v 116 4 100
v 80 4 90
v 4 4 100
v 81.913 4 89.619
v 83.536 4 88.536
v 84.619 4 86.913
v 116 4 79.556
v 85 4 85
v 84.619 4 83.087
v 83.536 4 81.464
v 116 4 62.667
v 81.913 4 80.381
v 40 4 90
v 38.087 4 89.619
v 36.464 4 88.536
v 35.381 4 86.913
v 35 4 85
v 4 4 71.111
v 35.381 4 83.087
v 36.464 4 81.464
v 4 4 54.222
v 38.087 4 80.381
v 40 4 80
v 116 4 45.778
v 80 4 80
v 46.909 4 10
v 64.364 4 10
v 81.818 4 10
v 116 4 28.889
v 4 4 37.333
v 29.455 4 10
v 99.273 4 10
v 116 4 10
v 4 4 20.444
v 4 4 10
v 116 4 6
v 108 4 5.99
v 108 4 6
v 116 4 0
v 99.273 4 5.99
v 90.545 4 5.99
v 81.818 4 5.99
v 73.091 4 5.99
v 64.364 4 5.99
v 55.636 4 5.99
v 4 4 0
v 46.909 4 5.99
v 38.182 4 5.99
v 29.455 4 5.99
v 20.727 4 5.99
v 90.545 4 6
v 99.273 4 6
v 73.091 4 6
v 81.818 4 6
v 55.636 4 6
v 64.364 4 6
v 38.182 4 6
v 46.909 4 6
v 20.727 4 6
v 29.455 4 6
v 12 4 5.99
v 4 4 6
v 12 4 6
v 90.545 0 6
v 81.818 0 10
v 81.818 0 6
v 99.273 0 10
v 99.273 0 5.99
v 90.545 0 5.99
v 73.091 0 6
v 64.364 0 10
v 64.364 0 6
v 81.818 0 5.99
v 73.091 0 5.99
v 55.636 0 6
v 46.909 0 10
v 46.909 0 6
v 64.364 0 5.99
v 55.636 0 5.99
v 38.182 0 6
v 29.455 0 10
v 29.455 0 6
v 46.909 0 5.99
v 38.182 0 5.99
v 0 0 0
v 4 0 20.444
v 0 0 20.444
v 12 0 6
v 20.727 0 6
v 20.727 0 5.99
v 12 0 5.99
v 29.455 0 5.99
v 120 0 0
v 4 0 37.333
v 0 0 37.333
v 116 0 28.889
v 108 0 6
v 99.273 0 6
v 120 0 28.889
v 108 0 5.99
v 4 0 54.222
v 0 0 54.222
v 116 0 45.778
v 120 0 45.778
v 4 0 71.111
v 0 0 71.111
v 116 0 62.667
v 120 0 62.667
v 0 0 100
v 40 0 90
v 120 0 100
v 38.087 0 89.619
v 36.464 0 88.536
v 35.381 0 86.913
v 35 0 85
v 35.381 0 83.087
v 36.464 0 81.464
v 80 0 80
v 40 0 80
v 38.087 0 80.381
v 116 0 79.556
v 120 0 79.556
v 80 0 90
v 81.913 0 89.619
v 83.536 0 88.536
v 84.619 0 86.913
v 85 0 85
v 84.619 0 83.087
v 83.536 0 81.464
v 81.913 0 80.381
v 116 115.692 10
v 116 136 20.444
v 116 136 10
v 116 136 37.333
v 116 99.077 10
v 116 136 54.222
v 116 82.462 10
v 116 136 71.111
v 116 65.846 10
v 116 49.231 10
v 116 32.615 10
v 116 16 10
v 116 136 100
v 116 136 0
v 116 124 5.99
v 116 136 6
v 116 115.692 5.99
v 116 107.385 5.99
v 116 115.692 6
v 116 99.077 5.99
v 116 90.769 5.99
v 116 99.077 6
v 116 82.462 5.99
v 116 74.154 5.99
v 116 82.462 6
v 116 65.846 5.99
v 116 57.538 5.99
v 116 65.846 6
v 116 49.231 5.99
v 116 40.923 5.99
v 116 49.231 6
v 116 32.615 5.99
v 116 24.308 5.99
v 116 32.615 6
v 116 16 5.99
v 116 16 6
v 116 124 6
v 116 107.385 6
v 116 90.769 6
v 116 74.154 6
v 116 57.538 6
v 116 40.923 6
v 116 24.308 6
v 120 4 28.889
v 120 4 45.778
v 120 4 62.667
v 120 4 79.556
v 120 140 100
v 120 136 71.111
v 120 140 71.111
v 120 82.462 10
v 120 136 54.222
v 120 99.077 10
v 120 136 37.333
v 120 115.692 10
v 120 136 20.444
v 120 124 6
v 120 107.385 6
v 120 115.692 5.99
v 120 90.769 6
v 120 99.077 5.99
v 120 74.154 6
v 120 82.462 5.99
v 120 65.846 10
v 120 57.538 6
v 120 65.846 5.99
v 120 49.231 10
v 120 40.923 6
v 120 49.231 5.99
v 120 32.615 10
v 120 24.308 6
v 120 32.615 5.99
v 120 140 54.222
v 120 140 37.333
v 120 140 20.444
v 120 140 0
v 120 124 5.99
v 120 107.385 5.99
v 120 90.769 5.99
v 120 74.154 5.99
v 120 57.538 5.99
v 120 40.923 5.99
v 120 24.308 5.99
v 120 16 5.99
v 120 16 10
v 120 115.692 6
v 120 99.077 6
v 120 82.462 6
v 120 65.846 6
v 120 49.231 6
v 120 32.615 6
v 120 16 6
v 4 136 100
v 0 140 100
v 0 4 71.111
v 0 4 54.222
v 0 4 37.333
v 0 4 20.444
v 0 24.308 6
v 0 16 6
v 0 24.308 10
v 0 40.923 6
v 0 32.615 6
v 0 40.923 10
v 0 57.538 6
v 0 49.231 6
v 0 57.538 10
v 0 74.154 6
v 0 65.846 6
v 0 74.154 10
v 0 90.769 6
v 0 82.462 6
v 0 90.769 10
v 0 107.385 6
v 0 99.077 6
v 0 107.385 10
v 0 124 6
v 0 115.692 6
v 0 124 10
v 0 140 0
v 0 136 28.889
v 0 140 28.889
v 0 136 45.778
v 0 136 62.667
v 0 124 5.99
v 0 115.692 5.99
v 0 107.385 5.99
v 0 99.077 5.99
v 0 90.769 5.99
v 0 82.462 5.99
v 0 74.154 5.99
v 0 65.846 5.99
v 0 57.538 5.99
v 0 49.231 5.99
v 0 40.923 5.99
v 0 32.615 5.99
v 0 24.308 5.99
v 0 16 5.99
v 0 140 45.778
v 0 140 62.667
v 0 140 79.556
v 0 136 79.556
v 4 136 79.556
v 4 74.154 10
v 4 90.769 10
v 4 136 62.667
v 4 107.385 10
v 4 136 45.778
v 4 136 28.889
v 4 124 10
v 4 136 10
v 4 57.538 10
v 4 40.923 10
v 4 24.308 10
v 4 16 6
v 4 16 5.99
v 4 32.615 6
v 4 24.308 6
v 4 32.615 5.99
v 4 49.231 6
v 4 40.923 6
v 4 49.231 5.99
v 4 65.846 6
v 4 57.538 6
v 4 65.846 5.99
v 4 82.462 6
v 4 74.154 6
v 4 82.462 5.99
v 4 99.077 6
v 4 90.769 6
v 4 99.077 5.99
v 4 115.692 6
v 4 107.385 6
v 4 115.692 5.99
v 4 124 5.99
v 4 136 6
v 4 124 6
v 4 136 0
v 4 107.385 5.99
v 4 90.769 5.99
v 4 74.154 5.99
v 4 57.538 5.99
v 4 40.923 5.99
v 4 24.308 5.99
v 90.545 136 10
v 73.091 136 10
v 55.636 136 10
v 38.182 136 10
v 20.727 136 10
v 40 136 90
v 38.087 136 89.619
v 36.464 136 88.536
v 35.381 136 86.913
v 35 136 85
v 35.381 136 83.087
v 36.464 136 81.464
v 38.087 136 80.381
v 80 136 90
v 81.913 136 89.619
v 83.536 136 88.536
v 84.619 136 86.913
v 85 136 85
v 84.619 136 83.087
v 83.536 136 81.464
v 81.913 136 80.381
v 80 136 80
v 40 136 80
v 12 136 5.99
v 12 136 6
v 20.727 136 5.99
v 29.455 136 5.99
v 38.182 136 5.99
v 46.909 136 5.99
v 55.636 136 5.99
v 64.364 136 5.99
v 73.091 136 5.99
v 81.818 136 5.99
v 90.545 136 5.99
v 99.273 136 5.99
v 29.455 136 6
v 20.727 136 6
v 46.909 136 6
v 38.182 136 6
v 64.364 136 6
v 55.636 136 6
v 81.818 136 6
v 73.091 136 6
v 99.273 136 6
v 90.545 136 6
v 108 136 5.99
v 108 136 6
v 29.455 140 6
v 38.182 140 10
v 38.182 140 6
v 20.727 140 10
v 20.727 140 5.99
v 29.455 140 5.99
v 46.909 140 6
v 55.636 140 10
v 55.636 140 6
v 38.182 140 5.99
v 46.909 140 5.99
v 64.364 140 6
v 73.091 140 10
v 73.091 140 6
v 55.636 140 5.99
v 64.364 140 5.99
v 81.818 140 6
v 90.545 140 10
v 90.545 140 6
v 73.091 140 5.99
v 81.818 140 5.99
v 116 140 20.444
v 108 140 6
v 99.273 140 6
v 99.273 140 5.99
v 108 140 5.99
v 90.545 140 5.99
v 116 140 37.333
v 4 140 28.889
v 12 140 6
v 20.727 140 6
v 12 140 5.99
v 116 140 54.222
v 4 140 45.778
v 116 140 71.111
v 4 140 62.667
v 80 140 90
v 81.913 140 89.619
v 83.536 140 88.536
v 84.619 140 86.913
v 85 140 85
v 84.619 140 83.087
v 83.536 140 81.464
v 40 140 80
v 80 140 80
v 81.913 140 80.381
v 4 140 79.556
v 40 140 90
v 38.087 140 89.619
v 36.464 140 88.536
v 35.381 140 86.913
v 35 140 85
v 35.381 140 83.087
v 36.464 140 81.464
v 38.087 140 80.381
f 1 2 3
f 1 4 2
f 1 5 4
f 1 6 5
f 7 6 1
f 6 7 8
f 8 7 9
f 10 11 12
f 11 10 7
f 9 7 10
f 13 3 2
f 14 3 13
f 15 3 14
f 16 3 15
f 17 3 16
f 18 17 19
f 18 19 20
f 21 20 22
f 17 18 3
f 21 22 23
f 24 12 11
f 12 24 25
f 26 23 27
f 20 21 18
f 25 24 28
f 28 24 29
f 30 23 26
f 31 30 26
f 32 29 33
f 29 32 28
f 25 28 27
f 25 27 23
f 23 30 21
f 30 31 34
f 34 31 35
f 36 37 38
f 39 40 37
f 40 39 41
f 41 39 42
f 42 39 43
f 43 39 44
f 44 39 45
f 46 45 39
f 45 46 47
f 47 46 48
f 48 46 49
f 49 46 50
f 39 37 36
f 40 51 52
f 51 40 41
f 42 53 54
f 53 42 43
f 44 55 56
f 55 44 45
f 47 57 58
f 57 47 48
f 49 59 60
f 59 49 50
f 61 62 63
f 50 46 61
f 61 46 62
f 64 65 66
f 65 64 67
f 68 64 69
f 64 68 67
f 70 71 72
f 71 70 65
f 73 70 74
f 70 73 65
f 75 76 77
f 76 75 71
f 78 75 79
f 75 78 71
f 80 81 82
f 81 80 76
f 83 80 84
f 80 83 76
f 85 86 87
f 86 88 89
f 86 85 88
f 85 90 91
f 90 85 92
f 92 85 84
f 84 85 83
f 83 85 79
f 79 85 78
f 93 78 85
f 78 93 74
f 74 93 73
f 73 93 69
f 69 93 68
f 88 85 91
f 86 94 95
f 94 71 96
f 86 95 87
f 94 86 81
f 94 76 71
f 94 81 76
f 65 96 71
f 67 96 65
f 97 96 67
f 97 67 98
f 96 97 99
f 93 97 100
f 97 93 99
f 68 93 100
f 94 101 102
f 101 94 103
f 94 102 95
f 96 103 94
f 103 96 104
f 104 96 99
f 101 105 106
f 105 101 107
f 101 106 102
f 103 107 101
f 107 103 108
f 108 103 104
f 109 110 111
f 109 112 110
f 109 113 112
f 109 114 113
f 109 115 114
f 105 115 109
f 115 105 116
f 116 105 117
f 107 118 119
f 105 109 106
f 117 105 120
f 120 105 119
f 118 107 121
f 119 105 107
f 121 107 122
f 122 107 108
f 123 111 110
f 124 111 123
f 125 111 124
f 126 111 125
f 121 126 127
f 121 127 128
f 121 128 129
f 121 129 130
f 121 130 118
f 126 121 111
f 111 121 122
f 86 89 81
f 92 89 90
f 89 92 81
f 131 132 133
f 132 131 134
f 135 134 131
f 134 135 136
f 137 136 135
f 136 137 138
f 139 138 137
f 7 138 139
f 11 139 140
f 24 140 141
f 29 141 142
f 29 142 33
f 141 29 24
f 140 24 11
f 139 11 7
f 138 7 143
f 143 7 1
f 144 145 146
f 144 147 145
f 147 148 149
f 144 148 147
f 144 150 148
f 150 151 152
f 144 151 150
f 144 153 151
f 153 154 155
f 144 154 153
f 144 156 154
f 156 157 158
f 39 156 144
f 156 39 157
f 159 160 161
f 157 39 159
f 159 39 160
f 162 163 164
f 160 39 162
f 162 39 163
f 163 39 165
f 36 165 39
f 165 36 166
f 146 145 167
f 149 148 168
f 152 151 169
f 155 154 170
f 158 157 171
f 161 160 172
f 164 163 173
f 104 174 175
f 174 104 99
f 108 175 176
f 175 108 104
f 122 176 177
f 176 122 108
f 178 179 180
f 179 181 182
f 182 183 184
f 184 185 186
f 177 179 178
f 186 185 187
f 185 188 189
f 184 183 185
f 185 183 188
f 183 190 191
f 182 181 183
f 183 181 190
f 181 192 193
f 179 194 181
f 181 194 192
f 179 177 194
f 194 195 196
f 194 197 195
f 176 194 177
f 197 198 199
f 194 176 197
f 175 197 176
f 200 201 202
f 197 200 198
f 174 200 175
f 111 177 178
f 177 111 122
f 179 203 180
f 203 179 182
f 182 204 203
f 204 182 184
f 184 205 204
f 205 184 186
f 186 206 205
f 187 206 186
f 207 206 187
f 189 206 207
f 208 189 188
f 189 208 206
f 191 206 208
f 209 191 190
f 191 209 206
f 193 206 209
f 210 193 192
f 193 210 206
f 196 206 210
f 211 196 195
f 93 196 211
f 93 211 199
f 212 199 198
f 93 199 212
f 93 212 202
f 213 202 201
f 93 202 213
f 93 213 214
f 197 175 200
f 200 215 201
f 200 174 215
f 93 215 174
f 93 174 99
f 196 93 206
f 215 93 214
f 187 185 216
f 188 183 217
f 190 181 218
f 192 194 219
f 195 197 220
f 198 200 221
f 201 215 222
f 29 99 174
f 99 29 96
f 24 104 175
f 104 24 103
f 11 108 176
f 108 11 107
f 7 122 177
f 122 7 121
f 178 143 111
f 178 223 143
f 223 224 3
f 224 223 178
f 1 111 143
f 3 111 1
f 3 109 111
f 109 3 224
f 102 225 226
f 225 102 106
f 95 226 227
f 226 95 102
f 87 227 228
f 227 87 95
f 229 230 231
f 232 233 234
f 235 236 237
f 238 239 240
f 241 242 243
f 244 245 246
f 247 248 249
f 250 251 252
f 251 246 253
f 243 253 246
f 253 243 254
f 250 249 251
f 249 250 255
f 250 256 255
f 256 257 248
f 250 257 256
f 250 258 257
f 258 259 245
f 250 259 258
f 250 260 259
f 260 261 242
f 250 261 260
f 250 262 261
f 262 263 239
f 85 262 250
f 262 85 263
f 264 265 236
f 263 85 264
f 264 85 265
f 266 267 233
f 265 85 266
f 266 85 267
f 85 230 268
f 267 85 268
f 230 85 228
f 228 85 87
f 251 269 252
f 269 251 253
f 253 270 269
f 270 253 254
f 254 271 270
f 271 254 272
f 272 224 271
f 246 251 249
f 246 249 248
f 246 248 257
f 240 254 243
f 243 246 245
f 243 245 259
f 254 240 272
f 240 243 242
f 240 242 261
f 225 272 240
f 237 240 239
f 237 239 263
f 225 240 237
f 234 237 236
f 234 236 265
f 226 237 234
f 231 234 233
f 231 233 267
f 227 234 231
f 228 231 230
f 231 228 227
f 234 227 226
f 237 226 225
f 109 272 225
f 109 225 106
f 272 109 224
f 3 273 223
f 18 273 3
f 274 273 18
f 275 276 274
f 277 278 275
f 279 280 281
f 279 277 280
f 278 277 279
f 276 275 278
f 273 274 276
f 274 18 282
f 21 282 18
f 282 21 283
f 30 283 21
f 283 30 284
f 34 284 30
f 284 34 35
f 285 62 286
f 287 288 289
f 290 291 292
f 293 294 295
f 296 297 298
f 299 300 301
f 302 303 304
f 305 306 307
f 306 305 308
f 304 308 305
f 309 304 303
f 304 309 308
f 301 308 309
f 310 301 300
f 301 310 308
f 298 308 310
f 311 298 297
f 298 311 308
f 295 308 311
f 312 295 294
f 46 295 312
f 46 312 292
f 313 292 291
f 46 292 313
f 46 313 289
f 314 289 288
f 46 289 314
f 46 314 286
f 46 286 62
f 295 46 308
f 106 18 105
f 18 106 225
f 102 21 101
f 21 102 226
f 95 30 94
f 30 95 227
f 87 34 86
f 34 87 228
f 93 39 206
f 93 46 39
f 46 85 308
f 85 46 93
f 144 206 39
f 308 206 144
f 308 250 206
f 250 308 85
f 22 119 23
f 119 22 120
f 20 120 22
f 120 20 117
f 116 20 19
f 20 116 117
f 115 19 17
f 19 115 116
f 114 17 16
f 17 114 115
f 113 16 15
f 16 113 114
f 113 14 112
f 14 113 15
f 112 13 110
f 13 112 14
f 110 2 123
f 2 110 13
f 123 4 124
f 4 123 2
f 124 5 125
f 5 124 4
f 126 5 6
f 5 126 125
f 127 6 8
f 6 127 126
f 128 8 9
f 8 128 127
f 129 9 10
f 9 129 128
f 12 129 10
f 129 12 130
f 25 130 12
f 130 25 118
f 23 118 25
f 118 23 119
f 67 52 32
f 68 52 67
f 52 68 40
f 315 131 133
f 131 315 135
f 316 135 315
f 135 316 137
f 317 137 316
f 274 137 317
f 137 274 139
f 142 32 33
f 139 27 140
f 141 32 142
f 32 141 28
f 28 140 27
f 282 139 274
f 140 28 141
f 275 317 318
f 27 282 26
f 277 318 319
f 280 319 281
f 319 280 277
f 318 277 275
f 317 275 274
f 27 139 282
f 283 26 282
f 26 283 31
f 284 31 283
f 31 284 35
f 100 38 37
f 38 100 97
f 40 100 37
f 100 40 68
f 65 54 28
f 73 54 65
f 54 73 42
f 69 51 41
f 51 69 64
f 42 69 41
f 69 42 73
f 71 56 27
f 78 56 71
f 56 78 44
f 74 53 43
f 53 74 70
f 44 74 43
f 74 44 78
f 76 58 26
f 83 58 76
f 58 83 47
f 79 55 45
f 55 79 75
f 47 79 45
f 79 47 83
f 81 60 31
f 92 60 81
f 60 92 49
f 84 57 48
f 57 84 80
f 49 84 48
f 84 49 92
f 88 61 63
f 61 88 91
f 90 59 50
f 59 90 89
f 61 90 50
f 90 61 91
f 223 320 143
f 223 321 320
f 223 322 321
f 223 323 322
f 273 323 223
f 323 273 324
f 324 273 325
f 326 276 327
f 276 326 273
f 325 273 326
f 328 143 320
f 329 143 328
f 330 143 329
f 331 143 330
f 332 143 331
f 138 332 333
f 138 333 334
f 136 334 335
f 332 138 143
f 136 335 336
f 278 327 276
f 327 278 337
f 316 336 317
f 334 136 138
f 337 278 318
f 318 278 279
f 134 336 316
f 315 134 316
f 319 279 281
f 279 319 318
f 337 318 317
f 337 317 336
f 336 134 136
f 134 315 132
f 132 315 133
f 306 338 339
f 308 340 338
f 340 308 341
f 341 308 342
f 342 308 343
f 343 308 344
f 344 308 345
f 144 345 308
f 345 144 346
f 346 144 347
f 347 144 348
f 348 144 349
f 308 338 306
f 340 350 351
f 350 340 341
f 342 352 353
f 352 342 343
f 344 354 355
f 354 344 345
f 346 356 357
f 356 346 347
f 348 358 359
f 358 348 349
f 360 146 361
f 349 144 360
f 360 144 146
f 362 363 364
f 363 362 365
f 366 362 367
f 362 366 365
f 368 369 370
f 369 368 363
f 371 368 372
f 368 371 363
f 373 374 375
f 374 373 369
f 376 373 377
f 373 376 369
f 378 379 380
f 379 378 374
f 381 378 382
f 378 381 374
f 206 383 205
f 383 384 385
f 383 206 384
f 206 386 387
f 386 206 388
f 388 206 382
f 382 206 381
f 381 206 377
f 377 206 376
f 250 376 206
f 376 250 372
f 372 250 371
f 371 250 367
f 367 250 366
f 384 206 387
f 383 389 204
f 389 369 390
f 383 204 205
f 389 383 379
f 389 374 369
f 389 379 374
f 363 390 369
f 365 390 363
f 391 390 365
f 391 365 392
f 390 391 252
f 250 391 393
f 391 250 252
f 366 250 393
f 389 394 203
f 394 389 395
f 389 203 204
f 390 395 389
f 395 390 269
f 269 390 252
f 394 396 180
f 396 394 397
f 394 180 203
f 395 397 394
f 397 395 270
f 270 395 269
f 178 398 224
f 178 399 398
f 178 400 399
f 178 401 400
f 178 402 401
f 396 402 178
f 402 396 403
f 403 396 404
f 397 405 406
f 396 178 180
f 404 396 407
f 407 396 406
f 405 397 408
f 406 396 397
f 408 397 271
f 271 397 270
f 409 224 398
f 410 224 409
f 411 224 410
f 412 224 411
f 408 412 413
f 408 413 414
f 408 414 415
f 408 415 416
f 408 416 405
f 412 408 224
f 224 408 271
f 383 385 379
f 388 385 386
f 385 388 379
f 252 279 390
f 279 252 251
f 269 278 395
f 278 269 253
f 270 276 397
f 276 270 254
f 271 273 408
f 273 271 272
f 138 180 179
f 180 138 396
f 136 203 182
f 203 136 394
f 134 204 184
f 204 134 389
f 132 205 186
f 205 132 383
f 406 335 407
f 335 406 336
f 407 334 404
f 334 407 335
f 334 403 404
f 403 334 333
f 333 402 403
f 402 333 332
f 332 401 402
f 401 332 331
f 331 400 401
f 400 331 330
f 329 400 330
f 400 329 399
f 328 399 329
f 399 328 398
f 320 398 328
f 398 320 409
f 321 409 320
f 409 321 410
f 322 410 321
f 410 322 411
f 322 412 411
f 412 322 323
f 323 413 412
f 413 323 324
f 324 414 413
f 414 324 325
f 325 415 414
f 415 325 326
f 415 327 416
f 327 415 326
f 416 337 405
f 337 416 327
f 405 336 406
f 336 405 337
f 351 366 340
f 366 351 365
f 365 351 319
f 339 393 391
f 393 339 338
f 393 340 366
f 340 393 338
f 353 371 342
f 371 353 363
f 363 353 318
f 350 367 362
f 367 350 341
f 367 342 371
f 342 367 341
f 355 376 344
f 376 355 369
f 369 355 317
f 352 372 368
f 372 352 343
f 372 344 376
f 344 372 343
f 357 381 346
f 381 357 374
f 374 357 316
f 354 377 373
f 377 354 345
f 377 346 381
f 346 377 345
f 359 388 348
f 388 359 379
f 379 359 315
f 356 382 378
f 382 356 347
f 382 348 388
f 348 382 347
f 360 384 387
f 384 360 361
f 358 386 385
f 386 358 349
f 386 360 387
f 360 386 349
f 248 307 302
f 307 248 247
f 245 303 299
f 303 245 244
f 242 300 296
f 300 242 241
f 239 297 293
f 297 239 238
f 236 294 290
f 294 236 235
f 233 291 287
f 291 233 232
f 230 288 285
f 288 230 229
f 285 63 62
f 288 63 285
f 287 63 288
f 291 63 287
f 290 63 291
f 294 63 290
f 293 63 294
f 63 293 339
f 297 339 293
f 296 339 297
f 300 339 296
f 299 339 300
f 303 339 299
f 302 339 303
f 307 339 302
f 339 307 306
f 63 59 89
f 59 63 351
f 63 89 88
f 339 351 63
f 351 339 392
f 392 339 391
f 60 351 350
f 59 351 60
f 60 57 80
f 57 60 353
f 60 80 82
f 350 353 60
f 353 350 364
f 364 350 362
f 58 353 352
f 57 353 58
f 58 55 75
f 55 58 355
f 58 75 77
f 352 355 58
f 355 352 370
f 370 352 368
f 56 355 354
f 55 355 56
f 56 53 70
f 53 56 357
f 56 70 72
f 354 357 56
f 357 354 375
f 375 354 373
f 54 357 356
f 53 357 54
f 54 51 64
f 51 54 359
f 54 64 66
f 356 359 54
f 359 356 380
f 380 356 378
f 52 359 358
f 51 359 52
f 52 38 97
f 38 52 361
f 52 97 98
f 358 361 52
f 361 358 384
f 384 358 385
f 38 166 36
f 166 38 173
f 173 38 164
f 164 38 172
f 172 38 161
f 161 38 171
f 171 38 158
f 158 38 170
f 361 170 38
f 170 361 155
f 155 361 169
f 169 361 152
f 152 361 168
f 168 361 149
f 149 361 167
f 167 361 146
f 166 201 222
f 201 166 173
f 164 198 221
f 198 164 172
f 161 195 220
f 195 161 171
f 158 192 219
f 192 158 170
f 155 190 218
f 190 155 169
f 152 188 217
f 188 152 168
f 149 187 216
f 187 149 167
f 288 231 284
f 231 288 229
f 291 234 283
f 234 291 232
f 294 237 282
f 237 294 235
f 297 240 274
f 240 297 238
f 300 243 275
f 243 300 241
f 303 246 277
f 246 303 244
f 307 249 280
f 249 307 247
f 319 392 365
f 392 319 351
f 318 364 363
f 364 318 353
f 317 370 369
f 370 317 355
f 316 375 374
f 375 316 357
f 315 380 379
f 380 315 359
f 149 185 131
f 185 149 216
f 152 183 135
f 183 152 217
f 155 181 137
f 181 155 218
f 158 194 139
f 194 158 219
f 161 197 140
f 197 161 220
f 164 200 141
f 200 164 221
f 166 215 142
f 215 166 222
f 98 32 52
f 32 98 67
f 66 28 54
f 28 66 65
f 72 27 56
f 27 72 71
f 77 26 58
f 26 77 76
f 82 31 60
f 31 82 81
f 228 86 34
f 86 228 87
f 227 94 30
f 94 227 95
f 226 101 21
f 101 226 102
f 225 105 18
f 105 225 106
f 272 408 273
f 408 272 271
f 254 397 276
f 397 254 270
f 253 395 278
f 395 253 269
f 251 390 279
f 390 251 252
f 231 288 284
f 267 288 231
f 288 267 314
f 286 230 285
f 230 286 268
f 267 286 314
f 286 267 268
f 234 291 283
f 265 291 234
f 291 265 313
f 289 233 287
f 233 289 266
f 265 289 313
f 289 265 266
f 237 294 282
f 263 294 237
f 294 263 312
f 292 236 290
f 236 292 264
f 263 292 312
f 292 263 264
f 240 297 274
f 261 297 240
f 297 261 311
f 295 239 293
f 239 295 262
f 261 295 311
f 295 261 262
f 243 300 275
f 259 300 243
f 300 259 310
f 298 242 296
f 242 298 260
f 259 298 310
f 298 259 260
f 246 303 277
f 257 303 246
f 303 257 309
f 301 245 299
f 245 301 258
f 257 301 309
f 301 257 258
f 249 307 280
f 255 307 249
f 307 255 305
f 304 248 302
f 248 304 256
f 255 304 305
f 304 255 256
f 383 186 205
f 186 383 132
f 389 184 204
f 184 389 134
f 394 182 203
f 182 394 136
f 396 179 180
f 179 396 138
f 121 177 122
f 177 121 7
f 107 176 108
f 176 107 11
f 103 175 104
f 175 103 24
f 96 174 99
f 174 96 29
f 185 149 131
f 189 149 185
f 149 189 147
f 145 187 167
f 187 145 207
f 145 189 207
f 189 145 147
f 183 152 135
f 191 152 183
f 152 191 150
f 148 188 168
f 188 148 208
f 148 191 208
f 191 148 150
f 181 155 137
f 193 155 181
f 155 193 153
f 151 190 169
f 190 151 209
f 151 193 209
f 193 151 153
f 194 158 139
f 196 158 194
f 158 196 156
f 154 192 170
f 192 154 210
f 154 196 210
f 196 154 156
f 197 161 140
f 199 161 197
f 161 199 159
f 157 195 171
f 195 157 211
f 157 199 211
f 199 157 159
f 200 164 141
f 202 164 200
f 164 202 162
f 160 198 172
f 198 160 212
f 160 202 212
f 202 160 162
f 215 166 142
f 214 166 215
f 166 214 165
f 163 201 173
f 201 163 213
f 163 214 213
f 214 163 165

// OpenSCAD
// file: box.scad
// Display options:

explode = 0; // 3d explosion
front_color = "RoyalBlue";
back_color = "RoyalBlue";
bottom_color = "SlateBlue";
top_color = "SlateBlue";
left_color = "MediumAquamarine";
right_color = "MediumAquamarine";

// Cutting options:

kerf = 0.3; // Kerf width (cuts will be offset by half this)
labels = false;

// Examples:

// box(width = 130, height = 150, depth = 170, thickness = 4);
// box(width = 130, height = 150, depth = 170, thickness = 4, open = true, inset = 8);
// lidbox(width = 130, height = 150, depth = 170, thickness = 4);

// box2d();

// Internals:

e = 0.01;
kc = kerf / 2;

module box(width, height, depth, thickness, finger_width, finger_margin,
	   open = false, inset = 0, assemble = false,
     hole_width = false) {
  w = width;
  h = height;
  d = depth;
  t = thickness;
  hm = h - inset;
  fm = (finger_margin == undef) ? thickness * 2 : finger_margin;
  fw = (finger_width == undef) ? thickness * 2 : finger_width;
  keep_top = !open;

  module left() { cut_left() panel2d(d, h); }
  module right() { cut_right() panel2d(d, h); }
  module top() { cut_top() panel2d(w, d); }
  module bottom() { cut_bottom() panel2d(w, d); }
  module back() { cut_back() panel2d(w, h); }
  module front() { cut_front() panel2d(w, h); }

  module front3d() {
    translate([0,t-explode,0])
      rotate(90, [1,0,0])
      panelize(w,h, "Front", front_color)
      front();
  }

  module back3d() {
    translate([w,d-t+explode,0])
      rotate(-90, [1,0,0])
      rotate(180,[0,0,1])
      panelize(w, h, "Back", back_color)
      back();
  }

  module bottom3d() {
    translate([w,0,t-explode])
      rotate(180,[0,1,0])
      panelize(w, d, "Bottom", bottom_color)
      bottom();
  }

  module top3d() {
    translate([0,0,h-t+explode])
      panelize(w, d, "Top", top_color)
      top();
  }

  module left3d() {
    translate([t-explode,d,0])
      rotate(-90,[0,1,0])
      rotate(-90,[0,0,1])
      panelize(d, h, "Left", left_color)
      left();
  }

  module right3d() {
    translate([w-t+explode,0,0])
      rotate(90,[0,1,0])
      rotate(90,[0,0,1])
      panelize(d, h, "Right", right_color)
      right();
  }

  module box2d() {
    compkerf() front();
    x1 = w + kc * 2 + e;
    translate([x1,0]) compkerf() back();
    x2 = x1 + w + 2 * kc + e;
    translate([x2,0]) compkerf() left();
    x3 = x2 + d + 2 * kc + e;
    translate([x3,0]) compkerf() right();
    y1 = h + kc * 2 + e;
    x4 = 0;
    translate([x4,y1]) compkerf() bottom();
    if (keep_top) {
	 x5 = w + 2 * kc + e;
	 translate([x5,y1]) compkerf() top();
    }
  }

  module box3d() {
    front3d(w, h, d);
    back3d(w, h, d);
    translate([0,0,inset]) bottom3d();
    if (keep_top)
      top3d();
    left3d();
    right3d();
  }

  module cut_front() {
    difference() {
      children();
      translate([0,inset]) cuts(w);
      if (keep_top) movecutstop(w, h) cuts(w);
      movecutsleft(w, h) cuts(h);
      movecutsright(w, h) cuts(h);
      if (hole_width) {
	   r = hole_height / 2;
	   hull() {
		translate([w/2 - hole_width/2 + r, h - hole_margin - r])
		     circle(r = r);
		translate([w/2 + hole_width/2 - r, h - hole_margin - r])
		     circle(r = r);
	   }
      }
    }
  }

  module cut_top() {
    difference() {
      children();
      invcuts(w);
      movecutstop(w, d) invcuts(w);
      movecutsleft(w, d) translate([t,0]) invcuts(d-2*t);
      movecutsright(w, d) translate([t,0]) invcuts(d-2*t);
    }
  }

  module cut_left() {
    difference() {
      children();
      translate([t,inset]) cuts(d-2*t);
      if (keep_top) movecutstop(d, h) translate([t,0]) cuts(d-2*t);
      movecutsleft(d, h) invcuts(h);
      movecutsright(d, h) invcuts(h);
    }
  }

  module cut_bottom() { cut_top() children(); }
  module cut_right() { cut_left() children(); }
  module cut_back() { cut_front() children(); }

  module cuts(tw, li = 0, ri = 0) {
    w = tw - li - ri;
    innerw = w - t*2 - 2 * fm;
    tc1 = floor((innerw / fw - 1) / 2);
    tc = (tc1 < 0) ? 0 : tc1;
    steps = tc * 2 + 1;

    fw_fitting = innerw / steps;

    // Use a default finger if we cant fit one within margins
    fw1 = (innerw < fw) ? fw : fw_fitting;
    // Divide length by 3 if we can fit less that 3 fingers
    fw2 = (tw < fw * 3) ? (tw / 3) : fw1;

    stepsize = fw2;

    x = (w - steps * stepsize) / 2;
    fw_minimum = t;

    if (tw >= 3 * fw_minimum) {
      translate([li,0])
	for (i = [0:tc]) {
	  translate([x+i*stepsize*2,-e])
	    square([stepsize, t+e]);
	}
    }
  }

  module movecutstop(w, h) {
    translate([w,h,0])
      rotate(180,[0,0,1])
      children();
  }

  module movecutsleft(w, h) {
    translate([0, h/2])
      rotate(-90, [0,0,1])
      translate([-h/2,0])
      children();
  }

  module movecutsright(w, h) {
    translate([w-t,0])
      rotate(90,[0,0,1])
      translate([0,-t])
      children();
  }

  module invcuts(w, li = 0, ri = 0) {
    difference() {
      translate([-2*e,-e]) square([w+4*e,t+e]);
      cuts(w, li, ri);
    }
  }

  module panelize(x, y, name, cl) {
    color(cl)
      linear_extrude(height = t)
	 children();
    if (labels) {
	 color("Yellow")
	      translate([x/2,y/2,t+1])
	      text(text = name, halign = "center", valign="center");
    }
  }

  module panel2d(x, y) {
    square([x,y]);
  }

  if (assemble)
    box3d();
  else
    box2d();
}


// Kerf compensation modifier
module compkerf() { offset(delta = kc) children(); }
// main file
include <box.scad>
box(width = 120, height = 100, depth = 140, thickness = 4, open = true, assemble = true,
    hole_width = 50, hole_height = 10, hole_margin = 10,
    inset = 6
     );
